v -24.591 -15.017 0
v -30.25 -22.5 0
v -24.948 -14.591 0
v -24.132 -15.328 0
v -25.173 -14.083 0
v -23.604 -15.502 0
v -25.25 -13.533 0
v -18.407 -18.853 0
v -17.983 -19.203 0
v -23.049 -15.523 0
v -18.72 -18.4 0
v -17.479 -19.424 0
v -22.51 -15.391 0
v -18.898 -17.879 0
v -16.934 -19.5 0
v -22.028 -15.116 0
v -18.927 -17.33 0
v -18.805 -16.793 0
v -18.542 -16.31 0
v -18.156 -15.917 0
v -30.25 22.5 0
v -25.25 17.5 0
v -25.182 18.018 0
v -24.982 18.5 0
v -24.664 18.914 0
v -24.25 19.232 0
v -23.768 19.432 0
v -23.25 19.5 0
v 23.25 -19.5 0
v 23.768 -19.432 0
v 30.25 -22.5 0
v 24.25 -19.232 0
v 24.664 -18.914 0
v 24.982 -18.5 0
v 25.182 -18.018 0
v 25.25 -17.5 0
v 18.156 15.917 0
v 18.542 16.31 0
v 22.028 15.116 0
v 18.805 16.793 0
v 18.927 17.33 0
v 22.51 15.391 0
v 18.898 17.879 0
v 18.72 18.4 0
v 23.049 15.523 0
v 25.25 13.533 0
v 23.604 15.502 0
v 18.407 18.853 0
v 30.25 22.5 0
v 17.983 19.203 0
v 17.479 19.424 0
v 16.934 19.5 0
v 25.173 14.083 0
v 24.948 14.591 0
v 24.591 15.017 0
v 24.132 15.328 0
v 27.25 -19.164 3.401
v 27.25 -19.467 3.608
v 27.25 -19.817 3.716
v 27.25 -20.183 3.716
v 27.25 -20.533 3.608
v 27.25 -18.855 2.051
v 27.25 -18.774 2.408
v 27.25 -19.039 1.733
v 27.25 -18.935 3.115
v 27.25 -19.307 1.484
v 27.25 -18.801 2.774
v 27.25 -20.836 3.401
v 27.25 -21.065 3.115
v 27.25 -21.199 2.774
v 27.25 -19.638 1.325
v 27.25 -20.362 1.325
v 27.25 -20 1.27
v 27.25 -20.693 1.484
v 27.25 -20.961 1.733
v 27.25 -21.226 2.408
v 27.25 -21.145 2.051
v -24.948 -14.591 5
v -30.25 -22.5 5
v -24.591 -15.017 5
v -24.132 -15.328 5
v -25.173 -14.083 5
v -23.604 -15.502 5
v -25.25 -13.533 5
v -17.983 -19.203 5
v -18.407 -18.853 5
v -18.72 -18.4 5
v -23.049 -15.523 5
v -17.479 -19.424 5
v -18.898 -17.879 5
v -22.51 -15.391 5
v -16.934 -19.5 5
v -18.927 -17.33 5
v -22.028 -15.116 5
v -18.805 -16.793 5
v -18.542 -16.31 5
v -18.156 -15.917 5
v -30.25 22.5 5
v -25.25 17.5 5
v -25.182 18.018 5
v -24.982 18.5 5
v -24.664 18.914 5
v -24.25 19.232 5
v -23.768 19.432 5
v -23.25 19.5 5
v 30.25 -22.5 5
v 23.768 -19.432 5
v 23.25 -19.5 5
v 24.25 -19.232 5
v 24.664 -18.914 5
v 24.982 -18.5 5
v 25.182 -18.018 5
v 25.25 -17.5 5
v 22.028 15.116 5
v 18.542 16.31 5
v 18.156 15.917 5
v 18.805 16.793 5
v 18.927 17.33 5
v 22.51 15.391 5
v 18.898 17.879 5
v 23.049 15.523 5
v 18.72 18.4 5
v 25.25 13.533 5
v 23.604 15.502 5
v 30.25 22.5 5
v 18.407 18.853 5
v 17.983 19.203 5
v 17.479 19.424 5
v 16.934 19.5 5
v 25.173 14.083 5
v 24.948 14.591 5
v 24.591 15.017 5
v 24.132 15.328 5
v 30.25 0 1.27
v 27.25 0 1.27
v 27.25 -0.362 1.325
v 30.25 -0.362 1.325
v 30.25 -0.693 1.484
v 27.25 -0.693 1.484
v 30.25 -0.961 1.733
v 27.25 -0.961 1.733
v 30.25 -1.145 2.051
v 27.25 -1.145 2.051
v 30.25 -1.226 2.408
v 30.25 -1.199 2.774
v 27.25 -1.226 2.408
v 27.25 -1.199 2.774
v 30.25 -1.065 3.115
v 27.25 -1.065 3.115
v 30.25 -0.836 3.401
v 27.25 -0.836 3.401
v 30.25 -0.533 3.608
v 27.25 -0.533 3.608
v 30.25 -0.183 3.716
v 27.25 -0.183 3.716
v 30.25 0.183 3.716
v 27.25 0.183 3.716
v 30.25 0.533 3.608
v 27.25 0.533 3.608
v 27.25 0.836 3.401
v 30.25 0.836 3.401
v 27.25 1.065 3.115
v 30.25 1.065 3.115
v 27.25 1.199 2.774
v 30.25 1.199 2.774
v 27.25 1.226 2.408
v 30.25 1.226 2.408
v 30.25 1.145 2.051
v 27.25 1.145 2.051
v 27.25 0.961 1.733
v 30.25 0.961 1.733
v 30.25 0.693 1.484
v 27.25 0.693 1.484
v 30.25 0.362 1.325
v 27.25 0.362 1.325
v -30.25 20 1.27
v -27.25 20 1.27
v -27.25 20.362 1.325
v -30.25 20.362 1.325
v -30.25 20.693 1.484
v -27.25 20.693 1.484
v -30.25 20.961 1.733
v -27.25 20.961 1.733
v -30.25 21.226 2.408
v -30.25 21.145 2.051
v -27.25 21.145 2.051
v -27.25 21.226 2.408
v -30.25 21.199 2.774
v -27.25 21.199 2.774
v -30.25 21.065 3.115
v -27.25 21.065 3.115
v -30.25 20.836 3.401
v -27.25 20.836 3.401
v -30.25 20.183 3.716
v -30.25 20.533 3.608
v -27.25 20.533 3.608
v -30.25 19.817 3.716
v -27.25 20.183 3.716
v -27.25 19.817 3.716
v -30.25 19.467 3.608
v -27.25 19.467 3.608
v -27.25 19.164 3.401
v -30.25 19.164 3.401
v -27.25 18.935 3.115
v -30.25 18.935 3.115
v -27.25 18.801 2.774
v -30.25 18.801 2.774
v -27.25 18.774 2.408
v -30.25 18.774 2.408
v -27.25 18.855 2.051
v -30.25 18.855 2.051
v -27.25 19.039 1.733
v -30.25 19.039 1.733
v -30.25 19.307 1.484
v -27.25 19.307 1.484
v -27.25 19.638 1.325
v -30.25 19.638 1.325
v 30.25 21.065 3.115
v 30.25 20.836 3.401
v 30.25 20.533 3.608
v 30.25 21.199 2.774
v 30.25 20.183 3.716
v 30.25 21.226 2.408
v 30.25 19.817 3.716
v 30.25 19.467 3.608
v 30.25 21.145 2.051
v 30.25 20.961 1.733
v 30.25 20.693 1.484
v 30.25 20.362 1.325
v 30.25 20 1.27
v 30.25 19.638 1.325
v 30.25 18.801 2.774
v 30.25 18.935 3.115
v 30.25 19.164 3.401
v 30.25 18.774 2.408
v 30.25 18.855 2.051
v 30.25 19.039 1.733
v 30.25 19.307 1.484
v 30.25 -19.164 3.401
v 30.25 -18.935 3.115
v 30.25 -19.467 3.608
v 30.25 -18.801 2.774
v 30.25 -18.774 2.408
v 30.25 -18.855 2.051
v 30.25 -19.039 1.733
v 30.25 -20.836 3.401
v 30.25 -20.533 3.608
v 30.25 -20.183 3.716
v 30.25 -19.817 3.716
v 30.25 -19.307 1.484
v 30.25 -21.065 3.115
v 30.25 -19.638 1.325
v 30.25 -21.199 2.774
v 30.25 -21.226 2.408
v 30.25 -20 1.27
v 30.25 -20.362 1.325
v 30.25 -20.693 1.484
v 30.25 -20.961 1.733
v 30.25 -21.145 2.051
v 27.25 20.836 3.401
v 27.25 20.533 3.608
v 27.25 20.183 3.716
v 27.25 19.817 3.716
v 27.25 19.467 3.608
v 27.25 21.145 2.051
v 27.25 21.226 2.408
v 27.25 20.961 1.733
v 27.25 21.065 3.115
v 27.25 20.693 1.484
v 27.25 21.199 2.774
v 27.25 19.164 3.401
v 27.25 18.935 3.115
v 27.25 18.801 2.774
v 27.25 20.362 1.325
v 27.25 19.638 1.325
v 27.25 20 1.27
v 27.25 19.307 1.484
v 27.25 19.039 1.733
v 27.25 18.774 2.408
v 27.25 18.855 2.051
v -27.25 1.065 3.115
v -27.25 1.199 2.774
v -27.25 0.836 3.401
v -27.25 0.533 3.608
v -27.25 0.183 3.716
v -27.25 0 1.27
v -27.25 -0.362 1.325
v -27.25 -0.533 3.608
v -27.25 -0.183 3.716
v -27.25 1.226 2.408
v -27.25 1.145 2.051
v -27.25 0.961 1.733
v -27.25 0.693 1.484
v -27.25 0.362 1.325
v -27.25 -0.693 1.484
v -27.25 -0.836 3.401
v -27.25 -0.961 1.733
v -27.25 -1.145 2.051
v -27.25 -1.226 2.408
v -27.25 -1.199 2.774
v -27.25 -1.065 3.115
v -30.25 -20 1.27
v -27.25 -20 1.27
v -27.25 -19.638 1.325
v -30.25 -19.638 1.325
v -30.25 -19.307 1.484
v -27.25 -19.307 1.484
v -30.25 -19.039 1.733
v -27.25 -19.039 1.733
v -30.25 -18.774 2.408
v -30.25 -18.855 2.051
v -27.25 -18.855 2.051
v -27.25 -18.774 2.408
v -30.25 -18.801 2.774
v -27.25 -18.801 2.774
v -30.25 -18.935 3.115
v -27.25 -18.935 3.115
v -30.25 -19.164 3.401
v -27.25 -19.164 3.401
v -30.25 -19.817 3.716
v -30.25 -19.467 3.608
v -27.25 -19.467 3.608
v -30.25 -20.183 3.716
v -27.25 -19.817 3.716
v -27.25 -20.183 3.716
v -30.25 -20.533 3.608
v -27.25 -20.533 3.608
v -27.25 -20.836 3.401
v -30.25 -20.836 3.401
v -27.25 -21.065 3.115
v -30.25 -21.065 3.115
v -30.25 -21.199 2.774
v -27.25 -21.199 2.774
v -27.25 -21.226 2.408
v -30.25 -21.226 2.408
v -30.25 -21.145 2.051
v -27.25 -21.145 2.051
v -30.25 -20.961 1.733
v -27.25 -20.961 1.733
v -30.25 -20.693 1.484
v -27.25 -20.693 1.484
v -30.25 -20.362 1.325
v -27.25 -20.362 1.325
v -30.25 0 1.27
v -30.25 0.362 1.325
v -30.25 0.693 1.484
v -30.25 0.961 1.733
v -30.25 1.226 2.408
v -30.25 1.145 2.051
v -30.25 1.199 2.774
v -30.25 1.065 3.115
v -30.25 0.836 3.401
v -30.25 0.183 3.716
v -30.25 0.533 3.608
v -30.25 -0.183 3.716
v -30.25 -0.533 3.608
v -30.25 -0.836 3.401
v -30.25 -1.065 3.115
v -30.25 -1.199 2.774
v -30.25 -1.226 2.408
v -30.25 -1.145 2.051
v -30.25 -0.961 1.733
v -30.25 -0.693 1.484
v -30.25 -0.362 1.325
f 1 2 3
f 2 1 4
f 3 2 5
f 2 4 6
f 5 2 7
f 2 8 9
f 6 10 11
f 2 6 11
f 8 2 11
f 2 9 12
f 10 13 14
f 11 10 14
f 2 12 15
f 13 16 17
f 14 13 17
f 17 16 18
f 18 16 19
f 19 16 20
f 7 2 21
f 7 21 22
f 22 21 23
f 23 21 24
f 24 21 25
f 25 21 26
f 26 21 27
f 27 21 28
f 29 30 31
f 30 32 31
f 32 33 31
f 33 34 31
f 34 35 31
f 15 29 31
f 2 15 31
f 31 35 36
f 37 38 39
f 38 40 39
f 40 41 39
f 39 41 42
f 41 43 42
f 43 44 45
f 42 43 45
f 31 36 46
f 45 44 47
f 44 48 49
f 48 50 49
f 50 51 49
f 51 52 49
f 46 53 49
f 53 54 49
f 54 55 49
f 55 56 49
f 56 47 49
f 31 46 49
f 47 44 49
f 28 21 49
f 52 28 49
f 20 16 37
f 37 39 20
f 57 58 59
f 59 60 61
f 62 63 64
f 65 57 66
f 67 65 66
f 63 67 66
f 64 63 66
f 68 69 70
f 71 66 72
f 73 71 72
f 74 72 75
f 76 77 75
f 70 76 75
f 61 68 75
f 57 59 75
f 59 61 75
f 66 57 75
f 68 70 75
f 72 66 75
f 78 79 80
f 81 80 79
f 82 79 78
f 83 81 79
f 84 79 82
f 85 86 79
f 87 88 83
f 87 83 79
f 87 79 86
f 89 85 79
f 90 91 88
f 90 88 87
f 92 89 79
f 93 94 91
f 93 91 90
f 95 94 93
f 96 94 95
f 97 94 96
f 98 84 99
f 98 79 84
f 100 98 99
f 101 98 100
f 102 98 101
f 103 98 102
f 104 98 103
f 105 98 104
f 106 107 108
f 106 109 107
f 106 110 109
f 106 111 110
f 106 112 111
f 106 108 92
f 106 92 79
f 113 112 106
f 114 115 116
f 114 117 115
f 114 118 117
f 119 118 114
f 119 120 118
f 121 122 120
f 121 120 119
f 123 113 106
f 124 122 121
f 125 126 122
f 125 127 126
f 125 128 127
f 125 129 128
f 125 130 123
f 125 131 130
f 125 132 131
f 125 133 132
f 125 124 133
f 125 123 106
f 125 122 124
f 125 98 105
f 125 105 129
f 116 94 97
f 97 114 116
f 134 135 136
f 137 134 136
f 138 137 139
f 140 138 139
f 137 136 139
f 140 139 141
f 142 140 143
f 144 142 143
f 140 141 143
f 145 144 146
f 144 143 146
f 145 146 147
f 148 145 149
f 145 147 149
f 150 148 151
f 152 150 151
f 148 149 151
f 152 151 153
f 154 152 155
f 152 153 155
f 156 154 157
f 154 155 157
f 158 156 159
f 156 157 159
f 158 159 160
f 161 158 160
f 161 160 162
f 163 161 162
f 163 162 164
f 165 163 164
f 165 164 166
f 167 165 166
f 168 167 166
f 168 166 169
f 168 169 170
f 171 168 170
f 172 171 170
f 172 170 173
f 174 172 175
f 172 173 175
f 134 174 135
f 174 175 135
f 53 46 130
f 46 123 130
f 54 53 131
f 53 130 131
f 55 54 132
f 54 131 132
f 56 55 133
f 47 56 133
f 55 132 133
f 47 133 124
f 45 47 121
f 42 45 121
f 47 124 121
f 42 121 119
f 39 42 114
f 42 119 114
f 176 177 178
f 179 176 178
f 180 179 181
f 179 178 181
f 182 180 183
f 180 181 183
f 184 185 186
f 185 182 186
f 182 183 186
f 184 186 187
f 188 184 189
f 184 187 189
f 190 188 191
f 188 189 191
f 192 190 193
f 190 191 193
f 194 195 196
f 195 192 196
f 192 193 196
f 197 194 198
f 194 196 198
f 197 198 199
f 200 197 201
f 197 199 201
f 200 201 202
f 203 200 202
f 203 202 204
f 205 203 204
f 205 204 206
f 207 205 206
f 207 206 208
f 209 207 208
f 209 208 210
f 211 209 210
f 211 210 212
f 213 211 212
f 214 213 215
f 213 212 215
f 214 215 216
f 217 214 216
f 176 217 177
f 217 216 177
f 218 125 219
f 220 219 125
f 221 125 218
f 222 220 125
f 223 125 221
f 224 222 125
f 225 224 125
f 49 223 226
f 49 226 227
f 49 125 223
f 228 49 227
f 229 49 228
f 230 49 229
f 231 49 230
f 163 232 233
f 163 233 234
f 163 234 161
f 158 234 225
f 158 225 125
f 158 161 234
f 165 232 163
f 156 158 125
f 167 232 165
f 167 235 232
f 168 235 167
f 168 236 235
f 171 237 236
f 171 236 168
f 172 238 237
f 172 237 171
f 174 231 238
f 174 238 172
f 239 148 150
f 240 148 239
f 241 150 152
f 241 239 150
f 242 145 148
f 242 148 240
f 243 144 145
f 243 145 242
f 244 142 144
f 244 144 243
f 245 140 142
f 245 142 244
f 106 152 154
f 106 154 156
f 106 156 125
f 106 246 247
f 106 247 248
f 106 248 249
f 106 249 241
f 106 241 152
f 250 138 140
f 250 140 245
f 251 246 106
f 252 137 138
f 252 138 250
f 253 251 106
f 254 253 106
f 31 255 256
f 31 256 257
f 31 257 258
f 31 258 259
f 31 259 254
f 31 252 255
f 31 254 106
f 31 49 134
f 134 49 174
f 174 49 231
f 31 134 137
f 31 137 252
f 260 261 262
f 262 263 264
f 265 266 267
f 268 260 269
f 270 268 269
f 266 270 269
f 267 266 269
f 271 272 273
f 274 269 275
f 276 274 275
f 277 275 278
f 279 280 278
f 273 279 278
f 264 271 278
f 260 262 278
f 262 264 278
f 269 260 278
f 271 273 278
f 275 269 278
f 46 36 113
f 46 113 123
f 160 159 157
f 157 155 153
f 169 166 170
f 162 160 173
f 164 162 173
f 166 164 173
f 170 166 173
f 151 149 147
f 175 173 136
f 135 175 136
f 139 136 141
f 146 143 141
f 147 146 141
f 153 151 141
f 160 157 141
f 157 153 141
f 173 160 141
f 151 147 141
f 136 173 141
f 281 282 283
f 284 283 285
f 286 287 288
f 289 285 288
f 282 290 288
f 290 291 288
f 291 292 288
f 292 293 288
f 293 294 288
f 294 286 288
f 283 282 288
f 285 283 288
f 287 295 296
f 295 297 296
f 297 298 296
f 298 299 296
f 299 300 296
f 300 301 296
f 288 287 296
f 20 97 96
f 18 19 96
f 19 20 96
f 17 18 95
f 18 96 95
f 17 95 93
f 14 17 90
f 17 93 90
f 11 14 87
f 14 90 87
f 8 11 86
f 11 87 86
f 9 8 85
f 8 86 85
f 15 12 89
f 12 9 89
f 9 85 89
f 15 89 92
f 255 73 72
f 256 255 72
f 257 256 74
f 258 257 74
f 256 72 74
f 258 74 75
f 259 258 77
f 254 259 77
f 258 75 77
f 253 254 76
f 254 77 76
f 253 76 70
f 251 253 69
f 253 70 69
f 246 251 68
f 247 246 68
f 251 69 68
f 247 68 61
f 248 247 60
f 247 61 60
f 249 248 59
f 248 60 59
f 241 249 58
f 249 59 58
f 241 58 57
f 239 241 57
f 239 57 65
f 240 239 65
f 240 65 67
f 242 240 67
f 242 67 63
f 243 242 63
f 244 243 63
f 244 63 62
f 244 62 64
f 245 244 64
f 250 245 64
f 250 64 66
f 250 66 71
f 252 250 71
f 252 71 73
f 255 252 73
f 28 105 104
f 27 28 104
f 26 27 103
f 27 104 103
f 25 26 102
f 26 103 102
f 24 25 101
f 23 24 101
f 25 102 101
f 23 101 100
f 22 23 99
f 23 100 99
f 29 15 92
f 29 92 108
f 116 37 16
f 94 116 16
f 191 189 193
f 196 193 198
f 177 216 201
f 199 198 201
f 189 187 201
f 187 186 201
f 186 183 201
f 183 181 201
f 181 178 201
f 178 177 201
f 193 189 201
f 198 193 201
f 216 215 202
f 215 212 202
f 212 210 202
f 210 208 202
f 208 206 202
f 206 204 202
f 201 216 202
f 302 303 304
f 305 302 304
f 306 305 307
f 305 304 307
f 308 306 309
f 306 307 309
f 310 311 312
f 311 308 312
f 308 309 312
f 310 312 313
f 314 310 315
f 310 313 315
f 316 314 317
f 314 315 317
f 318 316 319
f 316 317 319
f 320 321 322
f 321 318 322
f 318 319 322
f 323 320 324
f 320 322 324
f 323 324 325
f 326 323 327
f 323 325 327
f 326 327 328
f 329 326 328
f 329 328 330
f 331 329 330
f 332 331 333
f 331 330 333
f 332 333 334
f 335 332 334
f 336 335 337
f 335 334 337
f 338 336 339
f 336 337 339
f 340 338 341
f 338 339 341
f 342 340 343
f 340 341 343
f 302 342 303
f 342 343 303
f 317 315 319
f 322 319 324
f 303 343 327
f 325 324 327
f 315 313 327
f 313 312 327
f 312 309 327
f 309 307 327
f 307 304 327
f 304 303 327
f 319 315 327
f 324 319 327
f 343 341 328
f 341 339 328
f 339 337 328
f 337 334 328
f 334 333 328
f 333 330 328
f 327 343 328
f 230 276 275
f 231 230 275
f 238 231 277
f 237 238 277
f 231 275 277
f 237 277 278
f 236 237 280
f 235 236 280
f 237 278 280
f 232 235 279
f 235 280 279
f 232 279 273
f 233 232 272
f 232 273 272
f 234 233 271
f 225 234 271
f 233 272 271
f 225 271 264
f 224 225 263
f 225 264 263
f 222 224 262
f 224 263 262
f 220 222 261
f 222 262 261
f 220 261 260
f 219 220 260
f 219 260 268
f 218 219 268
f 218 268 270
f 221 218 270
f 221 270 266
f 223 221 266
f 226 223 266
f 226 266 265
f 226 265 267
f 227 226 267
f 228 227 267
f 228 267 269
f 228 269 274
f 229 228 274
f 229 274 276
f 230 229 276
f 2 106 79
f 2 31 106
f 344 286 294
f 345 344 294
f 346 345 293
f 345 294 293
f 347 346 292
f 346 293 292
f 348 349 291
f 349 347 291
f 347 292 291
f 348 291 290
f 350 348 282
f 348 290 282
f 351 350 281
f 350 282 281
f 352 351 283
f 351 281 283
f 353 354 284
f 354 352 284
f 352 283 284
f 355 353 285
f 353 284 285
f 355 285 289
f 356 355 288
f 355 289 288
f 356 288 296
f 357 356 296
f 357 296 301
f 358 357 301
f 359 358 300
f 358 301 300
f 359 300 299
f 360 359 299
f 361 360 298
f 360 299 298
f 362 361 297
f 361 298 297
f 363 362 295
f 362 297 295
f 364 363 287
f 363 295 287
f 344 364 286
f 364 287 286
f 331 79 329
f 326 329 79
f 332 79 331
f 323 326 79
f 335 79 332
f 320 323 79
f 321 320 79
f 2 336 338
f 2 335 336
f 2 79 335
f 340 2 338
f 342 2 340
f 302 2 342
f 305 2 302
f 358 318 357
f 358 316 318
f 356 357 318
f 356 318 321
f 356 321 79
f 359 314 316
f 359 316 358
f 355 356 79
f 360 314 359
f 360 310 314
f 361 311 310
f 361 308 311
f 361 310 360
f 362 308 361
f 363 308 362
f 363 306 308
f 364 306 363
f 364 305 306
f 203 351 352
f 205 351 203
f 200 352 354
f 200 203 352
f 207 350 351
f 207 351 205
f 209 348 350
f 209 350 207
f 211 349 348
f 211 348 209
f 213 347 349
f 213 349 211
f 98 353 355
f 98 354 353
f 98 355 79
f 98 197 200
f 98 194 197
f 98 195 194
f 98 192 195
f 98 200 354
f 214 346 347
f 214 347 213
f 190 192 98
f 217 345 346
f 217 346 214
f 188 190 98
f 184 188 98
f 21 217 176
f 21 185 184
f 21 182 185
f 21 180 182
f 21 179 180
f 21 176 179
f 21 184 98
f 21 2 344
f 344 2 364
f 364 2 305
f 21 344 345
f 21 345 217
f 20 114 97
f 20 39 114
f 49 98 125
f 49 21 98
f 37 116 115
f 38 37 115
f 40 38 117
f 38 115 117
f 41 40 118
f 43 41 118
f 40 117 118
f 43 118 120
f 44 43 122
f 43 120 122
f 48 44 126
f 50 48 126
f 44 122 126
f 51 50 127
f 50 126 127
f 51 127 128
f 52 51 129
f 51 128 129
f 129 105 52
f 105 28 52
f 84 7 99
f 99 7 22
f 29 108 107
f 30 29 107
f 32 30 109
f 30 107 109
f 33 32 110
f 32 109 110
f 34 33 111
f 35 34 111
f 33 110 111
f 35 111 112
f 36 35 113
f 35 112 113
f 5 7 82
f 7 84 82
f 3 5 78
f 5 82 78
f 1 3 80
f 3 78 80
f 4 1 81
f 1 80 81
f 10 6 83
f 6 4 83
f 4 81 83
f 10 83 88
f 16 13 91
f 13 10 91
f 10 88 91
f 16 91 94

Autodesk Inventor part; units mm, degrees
ref_plane "YZ Plane" through (0, 0, 0) normal (1, 0, 0) x (0, 1, 0)
ref_plane "XZ Plane" through (0, 0, 0) normal (0, 1, 0) x (-1, 0, 0)
ref_plane "XY Plane" through (0, 0, 0) normal (0, 0, 1) x (1, 0, 0)
sketch "スケッチ1" plane through (0, 0, 0) normal (0, 0, 1) x (1, 0, 0)
  line L0 (-30.25, 22.5) -> (30.25, 22.5)
  line L1 (30.25, 22.5) -> (30.25, -22.5)
  line L2 (30.25, -22.5) -> (-30.25, -22.5)
  line L3 (-30.25, -22.5) -> (-30.25, 22.5)
  line L4 (-25.25, 19.5) -> (25.25, 19.5) construction
  line L5 (25.25, 19.5) -> (25.25, -19.5) construction
  line L6 (25.25, -19.5) -> (-25.25, -19.5) construction
  line L7 (-25.25, -19.5) -> (-25.25, 19.5) construction
  line L8 (25.25, 19.5) -> (-25.25, -19.5) construction
  line L9 (-25.25, -17.6048) -> (-25.25, 19.5)
  line L10 (-25.25, 19.5) -> (22.7959, 19.5)
  line L11 (22.7959, 19.5) -> (-25.25, -17.6048)
  line L12 (-22.7959, -19.5) -> (25.25, -19.5)
  line L13 (25.25, -19.5) -> (25.25, 17.6048)
  line L14 (25.25, 17.6048) -> (-22.7959, -19.5)
  line L15 (-30.25, 20) -> (30.25, 20) construction
  line L16 (30.25, -20) -> (-30.25, -20) construction
  line L17 (30.25, 20) -> (30.25, -20) construction
  point P0 (0, 0)
  point P1 (0, 19.5)
  point P2 (0, 22.5)
  point P3 (25.25, 0)
  point P4 (30.25, 0)
  dimension "d0" = 5
  dimension "d1" = 3
  dimension "d2" = 1.5
  dimension "d3" = 40
  dimension "d4" = 2.5
  dimension "d19" = 60.5
extrude "押し出し1" add sketch "スケッチ1" along normal blind 5
sketch "スケッチ2" plane through (30.25, -22.5, 0) normal (1, 0, 0) x (0, 0, -1)
  line L0 (0, 45) -> (-5, 45) projected
  line L1 (-5, 0) -> (-5, 45) projected
  line L2 (0, 22.5) -> (-5, 22.5) construction
  point P0 (-2.5, 2.5)
  point P1 (-2.5, 22.5)
  point P2 (-2.5, 42.5)
  point P3 (-2.5, 45)
  dimension "d7" = 40
hole "穴1" at (30.25, -20, 2.5) at (30.25, 0, 2.5) at (30.25, 20, 2.5) direction (-1, 0, 0) diameter 2.459 depth 3 thread size "M3x0.5" class "6H" standard "ISO Metric profile"
mirror "ミラー1" about plane through (0, 0, 0) normal (1, 0, 0) of "穴1"
fillet "フィレット1" radius 2 6 edges at (-22.7959, -19.5, 2.5) (-25.25, -17.6048, 2.5) (25.25, 17.6048, 2.5) (25.25, -19.5, 2.5) (-25.25, 19.5, 2.5) (22.7959, 19.5, 2.5)
equation "\"d3\" = d11_1"
equation "\"d7\" = d3"
equation "\"d11_1\" = 40"
properties part number "Link_front_diagonal" material "アルミニウム 2014-T4"
